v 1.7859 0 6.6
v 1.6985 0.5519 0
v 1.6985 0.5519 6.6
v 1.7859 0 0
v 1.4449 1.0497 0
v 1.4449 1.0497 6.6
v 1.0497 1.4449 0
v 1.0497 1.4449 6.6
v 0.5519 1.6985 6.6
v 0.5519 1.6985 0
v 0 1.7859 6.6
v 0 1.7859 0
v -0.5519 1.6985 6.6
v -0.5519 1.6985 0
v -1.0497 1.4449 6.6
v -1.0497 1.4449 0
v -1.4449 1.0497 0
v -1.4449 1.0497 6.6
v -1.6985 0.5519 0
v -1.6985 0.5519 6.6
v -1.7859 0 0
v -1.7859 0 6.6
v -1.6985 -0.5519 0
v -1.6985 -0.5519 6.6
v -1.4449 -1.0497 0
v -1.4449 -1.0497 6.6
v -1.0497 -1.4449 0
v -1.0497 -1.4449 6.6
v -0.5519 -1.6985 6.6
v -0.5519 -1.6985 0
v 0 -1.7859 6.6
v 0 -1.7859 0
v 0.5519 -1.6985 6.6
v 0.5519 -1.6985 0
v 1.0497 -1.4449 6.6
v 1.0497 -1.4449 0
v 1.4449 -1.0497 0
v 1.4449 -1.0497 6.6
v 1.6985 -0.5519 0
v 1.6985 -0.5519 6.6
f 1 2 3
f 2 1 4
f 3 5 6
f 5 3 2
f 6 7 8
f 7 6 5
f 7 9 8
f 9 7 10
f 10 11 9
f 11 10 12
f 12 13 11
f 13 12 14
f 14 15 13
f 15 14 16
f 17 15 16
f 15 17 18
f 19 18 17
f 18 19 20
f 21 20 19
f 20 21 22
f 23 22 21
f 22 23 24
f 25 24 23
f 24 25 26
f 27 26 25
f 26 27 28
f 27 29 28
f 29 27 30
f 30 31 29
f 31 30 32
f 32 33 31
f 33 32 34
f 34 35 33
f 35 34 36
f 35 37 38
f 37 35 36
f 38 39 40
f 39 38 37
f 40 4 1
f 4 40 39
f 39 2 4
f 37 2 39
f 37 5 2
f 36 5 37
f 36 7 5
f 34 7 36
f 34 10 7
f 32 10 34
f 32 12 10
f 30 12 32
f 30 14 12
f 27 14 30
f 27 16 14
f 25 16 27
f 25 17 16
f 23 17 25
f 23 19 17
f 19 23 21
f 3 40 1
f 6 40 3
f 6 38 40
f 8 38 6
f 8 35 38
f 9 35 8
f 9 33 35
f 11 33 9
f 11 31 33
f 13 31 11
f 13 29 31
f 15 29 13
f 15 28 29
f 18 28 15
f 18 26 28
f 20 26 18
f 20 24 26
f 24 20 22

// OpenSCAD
// Note: drill bit size in inches
function m2_5_insert_diameter() = 9/64 * 25.4; // mm
function m2_5_insert_length() = 5.6; // mm
module m2_5_insert_cutout() {
    insert_diam = m2_5_insert_diameter();
    insert_len = m2_5_insert_length();
    cylinder(r = insert_diam / 2, h = insert_len + 1, $fn=20);
}

function m3_insert_diameter() = 4.699; // mm (#13 drill bit
function m3_insert_length() = 6.4; // mm
module m3_insert_cutout() {
    color("Red", 0.25)
        cylinder(r = m3_insert_diameter() / 2, h = m3_insert_length() * 1.5);
}
m2_5_insert_cutout();
